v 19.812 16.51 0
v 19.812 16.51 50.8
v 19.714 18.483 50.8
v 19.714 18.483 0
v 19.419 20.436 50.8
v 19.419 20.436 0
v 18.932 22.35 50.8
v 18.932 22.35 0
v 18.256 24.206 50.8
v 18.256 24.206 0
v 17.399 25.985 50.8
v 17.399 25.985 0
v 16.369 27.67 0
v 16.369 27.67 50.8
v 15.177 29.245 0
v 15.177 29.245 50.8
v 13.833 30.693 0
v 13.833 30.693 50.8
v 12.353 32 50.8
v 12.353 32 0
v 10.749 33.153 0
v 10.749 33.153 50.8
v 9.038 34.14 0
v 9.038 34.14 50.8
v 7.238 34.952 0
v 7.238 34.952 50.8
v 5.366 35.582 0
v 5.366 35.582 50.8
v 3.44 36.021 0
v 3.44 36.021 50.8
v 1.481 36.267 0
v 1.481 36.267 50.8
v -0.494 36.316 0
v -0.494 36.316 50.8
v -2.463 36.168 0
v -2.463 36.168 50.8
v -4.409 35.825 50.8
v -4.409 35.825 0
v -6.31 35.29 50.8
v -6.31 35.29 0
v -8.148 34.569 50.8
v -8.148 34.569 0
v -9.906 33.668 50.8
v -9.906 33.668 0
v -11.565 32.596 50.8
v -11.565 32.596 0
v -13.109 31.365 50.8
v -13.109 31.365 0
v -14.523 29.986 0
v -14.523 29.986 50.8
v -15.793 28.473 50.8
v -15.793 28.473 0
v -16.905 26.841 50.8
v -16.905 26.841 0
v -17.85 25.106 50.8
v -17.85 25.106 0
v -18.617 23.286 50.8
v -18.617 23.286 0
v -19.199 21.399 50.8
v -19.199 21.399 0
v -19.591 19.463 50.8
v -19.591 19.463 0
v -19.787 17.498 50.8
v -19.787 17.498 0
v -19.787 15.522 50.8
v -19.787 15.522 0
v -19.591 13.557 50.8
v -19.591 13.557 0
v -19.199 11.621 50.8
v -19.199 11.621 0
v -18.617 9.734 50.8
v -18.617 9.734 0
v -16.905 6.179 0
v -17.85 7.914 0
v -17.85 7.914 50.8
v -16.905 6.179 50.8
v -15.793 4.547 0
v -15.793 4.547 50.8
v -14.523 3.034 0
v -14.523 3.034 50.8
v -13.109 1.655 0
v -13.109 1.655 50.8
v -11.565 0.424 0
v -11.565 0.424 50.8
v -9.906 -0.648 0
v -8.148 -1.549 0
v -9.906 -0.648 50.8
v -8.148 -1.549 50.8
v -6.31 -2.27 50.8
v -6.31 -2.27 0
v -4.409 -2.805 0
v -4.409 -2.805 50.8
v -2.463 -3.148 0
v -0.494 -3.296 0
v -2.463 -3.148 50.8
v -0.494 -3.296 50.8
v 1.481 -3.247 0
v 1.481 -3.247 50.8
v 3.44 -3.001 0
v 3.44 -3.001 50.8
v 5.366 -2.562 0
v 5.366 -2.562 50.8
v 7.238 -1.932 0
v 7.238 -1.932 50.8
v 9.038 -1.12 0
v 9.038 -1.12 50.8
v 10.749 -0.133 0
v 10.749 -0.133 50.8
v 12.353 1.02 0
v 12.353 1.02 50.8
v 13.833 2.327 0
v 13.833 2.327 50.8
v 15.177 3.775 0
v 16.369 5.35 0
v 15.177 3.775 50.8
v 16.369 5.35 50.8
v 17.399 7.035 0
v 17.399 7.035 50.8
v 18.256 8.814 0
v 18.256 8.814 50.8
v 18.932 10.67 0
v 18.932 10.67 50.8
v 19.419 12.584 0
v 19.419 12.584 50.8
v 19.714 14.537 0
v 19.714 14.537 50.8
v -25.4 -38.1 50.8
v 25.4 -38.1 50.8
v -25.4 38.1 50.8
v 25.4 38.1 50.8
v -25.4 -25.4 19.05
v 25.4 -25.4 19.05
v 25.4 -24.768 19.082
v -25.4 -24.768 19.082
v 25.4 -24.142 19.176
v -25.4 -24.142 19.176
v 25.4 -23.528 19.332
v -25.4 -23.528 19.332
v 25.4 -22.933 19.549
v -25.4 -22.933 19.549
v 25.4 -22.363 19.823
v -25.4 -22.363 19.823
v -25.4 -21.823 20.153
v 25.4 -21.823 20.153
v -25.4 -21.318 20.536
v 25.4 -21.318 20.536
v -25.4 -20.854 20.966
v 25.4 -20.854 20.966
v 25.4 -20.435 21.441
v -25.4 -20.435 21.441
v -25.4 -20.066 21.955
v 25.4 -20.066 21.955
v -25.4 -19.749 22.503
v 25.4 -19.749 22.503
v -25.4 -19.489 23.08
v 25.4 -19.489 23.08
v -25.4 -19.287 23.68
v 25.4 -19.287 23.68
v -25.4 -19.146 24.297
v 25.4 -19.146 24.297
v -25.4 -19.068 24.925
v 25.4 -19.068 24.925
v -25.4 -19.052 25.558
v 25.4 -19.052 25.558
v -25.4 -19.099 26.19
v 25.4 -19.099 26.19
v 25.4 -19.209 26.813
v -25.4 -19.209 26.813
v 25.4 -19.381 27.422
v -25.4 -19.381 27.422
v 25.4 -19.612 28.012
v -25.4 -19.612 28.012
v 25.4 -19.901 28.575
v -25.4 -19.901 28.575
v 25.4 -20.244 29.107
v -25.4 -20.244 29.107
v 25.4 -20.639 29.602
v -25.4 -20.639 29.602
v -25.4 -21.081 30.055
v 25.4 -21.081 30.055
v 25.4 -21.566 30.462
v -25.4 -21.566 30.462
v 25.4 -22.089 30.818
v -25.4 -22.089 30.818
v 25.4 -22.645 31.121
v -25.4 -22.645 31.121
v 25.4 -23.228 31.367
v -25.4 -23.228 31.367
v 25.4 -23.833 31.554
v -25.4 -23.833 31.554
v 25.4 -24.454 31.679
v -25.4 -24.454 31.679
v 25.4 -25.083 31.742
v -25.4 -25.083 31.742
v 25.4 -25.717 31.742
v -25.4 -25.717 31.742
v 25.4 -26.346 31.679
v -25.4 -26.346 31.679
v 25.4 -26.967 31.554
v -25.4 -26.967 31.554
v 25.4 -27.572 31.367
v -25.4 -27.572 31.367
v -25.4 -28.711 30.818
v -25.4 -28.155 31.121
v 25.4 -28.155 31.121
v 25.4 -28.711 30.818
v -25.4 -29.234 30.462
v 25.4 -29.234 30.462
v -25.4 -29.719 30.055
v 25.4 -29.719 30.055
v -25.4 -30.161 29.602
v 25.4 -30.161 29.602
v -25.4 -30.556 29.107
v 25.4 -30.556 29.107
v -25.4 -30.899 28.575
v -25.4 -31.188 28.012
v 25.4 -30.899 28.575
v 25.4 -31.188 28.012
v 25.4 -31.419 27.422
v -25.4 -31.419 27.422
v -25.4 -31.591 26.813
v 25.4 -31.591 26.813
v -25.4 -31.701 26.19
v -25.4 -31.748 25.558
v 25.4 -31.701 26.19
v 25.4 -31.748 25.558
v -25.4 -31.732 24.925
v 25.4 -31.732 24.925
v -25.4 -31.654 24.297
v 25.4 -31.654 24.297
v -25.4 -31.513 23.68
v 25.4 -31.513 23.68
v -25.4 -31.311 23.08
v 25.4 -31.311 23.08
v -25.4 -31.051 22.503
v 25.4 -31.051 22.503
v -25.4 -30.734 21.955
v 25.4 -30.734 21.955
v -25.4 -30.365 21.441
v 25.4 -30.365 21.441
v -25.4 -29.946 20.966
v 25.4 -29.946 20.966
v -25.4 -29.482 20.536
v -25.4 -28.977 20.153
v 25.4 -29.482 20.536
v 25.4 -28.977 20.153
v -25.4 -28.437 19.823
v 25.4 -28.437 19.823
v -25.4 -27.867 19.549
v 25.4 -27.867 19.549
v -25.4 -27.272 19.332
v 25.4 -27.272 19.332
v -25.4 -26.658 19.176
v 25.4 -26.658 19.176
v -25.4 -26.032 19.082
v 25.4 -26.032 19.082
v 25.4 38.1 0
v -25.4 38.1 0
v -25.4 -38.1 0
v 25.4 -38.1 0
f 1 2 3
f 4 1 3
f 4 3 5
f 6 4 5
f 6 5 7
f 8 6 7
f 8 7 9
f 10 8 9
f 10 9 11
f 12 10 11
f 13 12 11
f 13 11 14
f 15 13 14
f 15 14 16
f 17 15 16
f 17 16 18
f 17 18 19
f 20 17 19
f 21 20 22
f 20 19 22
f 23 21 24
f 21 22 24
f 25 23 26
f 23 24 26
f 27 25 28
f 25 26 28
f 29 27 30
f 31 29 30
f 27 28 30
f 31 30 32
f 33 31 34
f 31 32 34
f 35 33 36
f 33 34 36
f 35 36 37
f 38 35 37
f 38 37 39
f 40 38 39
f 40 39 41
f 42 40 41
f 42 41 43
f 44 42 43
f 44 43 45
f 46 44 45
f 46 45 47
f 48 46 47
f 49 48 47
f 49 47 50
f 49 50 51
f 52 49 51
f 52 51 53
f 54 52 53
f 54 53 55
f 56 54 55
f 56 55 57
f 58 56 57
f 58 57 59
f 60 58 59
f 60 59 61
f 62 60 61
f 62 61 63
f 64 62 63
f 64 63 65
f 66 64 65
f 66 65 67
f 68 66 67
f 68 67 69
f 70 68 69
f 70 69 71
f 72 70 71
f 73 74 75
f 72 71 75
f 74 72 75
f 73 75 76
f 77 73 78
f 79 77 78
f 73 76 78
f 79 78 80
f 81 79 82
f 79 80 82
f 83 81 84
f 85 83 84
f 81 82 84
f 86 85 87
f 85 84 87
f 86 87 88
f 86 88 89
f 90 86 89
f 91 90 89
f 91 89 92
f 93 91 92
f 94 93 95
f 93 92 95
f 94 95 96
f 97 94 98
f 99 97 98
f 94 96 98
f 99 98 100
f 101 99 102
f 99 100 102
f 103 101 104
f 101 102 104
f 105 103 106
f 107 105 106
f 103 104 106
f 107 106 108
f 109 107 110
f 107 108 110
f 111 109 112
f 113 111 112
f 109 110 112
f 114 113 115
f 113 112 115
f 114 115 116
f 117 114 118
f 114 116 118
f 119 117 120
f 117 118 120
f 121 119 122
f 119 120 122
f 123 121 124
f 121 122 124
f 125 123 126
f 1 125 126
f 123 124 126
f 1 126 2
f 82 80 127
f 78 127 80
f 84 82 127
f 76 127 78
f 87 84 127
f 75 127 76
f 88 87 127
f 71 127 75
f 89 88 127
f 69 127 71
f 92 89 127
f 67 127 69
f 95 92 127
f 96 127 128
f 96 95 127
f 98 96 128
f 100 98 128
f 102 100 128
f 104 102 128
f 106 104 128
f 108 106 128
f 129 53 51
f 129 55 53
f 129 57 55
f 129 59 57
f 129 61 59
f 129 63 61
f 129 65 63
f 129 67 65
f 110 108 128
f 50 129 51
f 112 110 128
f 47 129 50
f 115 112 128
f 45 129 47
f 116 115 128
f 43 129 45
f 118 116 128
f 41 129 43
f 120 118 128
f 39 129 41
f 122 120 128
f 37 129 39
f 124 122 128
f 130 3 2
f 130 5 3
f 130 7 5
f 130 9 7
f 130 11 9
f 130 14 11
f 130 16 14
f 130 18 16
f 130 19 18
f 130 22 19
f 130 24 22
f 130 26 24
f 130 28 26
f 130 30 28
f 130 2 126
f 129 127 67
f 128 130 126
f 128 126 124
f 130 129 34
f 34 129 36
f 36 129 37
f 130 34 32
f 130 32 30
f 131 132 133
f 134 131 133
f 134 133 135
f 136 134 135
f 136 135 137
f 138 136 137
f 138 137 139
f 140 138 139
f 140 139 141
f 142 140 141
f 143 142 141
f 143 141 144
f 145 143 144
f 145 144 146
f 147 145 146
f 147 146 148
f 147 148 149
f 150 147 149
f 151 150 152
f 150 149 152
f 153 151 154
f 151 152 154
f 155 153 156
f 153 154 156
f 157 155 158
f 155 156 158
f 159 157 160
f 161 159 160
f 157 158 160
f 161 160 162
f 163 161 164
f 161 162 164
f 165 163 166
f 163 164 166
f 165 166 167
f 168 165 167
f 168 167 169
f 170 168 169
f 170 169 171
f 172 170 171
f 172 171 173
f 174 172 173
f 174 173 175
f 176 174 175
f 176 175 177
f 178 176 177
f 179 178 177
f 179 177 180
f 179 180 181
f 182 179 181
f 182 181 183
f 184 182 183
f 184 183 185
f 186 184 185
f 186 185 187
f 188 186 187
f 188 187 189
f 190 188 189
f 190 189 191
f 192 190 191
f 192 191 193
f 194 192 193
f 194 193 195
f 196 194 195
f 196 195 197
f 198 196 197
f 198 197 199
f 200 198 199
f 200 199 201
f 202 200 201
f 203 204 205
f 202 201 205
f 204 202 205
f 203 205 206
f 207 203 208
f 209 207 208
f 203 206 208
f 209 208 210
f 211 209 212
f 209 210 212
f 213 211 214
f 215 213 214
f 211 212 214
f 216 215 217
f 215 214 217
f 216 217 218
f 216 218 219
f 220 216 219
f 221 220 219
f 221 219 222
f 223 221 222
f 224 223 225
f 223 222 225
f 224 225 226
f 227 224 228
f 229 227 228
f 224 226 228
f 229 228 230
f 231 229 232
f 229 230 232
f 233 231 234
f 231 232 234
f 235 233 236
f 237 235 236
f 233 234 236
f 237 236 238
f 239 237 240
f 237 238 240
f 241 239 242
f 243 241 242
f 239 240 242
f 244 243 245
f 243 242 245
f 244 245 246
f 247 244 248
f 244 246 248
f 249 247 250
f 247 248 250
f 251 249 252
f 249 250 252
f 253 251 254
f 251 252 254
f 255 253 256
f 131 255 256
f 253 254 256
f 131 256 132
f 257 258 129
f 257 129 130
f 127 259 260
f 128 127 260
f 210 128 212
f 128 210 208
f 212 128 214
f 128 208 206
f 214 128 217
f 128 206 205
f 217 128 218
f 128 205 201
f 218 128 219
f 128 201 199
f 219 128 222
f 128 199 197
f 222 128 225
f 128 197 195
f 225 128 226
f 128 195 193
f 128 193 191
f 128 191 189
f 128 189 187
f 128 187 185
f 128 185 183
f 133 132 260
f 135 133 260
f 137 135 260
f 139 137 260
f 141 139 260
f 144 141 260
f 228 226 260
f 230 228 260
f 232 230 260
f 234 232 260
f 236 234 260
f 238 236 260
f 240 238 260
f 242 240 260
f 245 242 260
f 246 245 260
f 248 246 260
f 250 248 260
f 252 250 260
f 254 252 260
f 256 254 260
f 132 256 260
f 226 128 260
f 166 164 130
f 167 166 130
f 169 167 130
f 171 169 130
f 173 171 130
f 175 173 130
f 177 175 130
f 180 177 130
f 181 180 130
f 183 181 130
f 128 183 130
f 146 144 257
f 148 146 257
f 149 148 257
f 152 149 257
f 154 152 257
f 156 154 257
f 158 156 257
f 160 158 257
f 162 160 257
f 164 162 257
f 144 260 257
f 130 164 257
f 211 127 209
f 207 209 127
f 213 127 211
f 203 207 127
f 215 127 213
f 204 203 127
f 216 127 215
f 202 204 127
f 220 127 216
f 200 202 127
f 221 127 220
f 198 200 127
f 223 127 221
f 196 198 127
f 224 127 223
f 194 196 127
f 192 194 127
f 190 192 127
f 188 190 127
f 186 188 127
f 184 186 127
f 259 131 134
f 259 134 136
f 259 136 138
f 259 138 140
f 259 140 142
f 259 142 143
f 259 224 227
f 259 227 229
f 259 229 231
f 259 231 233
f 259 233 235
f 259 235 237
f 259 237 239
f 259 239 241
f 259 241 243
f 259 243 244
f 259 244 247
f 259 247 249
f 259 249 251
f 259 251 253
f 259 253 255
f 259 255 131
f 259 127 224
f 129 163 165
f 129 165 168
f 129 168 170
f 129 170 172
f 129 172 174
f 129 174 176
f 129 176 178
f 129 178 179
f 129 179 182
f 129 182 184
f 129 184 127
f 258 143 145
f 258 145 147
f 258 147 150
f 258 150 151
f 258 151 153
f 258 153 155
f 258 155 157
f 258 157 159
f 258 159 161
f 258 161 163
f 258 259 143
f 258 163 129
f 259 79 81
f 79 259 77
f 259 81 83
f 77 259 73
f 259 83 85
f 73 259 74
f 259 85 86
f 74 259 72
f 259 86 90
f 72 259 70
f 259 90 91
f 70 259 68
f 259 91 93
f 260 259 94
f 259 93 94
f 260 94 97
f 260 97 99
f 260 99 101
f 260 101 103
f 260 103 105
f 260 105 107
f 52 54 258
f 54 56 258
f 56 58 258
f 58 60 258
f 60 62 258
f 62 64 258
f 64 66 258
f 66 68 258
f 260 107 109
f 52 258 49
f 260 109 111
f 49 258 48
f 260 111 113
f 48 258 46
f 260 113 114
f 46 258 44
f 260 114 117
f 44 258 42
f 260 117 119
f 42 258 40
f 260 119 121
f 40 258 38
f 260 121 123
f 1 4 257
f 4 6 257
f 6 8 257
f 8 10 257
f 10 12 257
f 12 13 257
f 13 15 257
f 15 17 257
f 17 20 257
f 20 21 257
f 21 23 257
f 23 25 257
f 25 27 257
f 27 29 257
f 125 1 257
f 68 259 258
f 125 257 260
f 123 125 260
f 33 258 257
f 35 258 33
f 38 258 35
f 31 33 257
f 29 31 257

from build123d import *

# Parameters (mm, degrees)
SKETCH1_W           = 50.8
SKETCH1_H           = 76.2
BOSS_EXTRUDE1_DEPTH = 50.8
SKETCH2_R           = 19.812
CUT_EXTRUDE1_DEPTH  = 51.8
SKETCH3_R           = 6.35
CUT_EXTRUDE2_DEPTH  = 51.8


with BuildPart() as part:
    # Sketch1 → Boss-Extrude1 (new body)
    with BuildSketch(Plane.XY):
        Rectangle(SKETCH1_W, SKETCH1_H)
    extrude(amount=BOSS_EXTRUDE1_DEPTH)

    # Sketch2 → Cut-Extrude1 (cut, through all)
    with BuildSketch(Plane.XY.offset(50.8)):
        with Locations((0, 16.51)):
            Circle(SKETCH2_R)
    extrude(amount=-CUT_EXTRUDE1_DEPTH, mode=Mode.SUBTRACT)

    # Sketch3 → Cut-Extrude2 (cut, through all)
    with BuildSketch(Plane(origin=(25.4, 0, 0), x_dir=(0, 0, -1), z_dir=(1, 0, 0))):
        with Locations((-25.4, -25.4)):
            Circle(SKETCH3_R)
    extrude(amount=-CUT_EXTRUDE2_DEPTH, mode=Mode.SUBTRACT)


solid = part.part
